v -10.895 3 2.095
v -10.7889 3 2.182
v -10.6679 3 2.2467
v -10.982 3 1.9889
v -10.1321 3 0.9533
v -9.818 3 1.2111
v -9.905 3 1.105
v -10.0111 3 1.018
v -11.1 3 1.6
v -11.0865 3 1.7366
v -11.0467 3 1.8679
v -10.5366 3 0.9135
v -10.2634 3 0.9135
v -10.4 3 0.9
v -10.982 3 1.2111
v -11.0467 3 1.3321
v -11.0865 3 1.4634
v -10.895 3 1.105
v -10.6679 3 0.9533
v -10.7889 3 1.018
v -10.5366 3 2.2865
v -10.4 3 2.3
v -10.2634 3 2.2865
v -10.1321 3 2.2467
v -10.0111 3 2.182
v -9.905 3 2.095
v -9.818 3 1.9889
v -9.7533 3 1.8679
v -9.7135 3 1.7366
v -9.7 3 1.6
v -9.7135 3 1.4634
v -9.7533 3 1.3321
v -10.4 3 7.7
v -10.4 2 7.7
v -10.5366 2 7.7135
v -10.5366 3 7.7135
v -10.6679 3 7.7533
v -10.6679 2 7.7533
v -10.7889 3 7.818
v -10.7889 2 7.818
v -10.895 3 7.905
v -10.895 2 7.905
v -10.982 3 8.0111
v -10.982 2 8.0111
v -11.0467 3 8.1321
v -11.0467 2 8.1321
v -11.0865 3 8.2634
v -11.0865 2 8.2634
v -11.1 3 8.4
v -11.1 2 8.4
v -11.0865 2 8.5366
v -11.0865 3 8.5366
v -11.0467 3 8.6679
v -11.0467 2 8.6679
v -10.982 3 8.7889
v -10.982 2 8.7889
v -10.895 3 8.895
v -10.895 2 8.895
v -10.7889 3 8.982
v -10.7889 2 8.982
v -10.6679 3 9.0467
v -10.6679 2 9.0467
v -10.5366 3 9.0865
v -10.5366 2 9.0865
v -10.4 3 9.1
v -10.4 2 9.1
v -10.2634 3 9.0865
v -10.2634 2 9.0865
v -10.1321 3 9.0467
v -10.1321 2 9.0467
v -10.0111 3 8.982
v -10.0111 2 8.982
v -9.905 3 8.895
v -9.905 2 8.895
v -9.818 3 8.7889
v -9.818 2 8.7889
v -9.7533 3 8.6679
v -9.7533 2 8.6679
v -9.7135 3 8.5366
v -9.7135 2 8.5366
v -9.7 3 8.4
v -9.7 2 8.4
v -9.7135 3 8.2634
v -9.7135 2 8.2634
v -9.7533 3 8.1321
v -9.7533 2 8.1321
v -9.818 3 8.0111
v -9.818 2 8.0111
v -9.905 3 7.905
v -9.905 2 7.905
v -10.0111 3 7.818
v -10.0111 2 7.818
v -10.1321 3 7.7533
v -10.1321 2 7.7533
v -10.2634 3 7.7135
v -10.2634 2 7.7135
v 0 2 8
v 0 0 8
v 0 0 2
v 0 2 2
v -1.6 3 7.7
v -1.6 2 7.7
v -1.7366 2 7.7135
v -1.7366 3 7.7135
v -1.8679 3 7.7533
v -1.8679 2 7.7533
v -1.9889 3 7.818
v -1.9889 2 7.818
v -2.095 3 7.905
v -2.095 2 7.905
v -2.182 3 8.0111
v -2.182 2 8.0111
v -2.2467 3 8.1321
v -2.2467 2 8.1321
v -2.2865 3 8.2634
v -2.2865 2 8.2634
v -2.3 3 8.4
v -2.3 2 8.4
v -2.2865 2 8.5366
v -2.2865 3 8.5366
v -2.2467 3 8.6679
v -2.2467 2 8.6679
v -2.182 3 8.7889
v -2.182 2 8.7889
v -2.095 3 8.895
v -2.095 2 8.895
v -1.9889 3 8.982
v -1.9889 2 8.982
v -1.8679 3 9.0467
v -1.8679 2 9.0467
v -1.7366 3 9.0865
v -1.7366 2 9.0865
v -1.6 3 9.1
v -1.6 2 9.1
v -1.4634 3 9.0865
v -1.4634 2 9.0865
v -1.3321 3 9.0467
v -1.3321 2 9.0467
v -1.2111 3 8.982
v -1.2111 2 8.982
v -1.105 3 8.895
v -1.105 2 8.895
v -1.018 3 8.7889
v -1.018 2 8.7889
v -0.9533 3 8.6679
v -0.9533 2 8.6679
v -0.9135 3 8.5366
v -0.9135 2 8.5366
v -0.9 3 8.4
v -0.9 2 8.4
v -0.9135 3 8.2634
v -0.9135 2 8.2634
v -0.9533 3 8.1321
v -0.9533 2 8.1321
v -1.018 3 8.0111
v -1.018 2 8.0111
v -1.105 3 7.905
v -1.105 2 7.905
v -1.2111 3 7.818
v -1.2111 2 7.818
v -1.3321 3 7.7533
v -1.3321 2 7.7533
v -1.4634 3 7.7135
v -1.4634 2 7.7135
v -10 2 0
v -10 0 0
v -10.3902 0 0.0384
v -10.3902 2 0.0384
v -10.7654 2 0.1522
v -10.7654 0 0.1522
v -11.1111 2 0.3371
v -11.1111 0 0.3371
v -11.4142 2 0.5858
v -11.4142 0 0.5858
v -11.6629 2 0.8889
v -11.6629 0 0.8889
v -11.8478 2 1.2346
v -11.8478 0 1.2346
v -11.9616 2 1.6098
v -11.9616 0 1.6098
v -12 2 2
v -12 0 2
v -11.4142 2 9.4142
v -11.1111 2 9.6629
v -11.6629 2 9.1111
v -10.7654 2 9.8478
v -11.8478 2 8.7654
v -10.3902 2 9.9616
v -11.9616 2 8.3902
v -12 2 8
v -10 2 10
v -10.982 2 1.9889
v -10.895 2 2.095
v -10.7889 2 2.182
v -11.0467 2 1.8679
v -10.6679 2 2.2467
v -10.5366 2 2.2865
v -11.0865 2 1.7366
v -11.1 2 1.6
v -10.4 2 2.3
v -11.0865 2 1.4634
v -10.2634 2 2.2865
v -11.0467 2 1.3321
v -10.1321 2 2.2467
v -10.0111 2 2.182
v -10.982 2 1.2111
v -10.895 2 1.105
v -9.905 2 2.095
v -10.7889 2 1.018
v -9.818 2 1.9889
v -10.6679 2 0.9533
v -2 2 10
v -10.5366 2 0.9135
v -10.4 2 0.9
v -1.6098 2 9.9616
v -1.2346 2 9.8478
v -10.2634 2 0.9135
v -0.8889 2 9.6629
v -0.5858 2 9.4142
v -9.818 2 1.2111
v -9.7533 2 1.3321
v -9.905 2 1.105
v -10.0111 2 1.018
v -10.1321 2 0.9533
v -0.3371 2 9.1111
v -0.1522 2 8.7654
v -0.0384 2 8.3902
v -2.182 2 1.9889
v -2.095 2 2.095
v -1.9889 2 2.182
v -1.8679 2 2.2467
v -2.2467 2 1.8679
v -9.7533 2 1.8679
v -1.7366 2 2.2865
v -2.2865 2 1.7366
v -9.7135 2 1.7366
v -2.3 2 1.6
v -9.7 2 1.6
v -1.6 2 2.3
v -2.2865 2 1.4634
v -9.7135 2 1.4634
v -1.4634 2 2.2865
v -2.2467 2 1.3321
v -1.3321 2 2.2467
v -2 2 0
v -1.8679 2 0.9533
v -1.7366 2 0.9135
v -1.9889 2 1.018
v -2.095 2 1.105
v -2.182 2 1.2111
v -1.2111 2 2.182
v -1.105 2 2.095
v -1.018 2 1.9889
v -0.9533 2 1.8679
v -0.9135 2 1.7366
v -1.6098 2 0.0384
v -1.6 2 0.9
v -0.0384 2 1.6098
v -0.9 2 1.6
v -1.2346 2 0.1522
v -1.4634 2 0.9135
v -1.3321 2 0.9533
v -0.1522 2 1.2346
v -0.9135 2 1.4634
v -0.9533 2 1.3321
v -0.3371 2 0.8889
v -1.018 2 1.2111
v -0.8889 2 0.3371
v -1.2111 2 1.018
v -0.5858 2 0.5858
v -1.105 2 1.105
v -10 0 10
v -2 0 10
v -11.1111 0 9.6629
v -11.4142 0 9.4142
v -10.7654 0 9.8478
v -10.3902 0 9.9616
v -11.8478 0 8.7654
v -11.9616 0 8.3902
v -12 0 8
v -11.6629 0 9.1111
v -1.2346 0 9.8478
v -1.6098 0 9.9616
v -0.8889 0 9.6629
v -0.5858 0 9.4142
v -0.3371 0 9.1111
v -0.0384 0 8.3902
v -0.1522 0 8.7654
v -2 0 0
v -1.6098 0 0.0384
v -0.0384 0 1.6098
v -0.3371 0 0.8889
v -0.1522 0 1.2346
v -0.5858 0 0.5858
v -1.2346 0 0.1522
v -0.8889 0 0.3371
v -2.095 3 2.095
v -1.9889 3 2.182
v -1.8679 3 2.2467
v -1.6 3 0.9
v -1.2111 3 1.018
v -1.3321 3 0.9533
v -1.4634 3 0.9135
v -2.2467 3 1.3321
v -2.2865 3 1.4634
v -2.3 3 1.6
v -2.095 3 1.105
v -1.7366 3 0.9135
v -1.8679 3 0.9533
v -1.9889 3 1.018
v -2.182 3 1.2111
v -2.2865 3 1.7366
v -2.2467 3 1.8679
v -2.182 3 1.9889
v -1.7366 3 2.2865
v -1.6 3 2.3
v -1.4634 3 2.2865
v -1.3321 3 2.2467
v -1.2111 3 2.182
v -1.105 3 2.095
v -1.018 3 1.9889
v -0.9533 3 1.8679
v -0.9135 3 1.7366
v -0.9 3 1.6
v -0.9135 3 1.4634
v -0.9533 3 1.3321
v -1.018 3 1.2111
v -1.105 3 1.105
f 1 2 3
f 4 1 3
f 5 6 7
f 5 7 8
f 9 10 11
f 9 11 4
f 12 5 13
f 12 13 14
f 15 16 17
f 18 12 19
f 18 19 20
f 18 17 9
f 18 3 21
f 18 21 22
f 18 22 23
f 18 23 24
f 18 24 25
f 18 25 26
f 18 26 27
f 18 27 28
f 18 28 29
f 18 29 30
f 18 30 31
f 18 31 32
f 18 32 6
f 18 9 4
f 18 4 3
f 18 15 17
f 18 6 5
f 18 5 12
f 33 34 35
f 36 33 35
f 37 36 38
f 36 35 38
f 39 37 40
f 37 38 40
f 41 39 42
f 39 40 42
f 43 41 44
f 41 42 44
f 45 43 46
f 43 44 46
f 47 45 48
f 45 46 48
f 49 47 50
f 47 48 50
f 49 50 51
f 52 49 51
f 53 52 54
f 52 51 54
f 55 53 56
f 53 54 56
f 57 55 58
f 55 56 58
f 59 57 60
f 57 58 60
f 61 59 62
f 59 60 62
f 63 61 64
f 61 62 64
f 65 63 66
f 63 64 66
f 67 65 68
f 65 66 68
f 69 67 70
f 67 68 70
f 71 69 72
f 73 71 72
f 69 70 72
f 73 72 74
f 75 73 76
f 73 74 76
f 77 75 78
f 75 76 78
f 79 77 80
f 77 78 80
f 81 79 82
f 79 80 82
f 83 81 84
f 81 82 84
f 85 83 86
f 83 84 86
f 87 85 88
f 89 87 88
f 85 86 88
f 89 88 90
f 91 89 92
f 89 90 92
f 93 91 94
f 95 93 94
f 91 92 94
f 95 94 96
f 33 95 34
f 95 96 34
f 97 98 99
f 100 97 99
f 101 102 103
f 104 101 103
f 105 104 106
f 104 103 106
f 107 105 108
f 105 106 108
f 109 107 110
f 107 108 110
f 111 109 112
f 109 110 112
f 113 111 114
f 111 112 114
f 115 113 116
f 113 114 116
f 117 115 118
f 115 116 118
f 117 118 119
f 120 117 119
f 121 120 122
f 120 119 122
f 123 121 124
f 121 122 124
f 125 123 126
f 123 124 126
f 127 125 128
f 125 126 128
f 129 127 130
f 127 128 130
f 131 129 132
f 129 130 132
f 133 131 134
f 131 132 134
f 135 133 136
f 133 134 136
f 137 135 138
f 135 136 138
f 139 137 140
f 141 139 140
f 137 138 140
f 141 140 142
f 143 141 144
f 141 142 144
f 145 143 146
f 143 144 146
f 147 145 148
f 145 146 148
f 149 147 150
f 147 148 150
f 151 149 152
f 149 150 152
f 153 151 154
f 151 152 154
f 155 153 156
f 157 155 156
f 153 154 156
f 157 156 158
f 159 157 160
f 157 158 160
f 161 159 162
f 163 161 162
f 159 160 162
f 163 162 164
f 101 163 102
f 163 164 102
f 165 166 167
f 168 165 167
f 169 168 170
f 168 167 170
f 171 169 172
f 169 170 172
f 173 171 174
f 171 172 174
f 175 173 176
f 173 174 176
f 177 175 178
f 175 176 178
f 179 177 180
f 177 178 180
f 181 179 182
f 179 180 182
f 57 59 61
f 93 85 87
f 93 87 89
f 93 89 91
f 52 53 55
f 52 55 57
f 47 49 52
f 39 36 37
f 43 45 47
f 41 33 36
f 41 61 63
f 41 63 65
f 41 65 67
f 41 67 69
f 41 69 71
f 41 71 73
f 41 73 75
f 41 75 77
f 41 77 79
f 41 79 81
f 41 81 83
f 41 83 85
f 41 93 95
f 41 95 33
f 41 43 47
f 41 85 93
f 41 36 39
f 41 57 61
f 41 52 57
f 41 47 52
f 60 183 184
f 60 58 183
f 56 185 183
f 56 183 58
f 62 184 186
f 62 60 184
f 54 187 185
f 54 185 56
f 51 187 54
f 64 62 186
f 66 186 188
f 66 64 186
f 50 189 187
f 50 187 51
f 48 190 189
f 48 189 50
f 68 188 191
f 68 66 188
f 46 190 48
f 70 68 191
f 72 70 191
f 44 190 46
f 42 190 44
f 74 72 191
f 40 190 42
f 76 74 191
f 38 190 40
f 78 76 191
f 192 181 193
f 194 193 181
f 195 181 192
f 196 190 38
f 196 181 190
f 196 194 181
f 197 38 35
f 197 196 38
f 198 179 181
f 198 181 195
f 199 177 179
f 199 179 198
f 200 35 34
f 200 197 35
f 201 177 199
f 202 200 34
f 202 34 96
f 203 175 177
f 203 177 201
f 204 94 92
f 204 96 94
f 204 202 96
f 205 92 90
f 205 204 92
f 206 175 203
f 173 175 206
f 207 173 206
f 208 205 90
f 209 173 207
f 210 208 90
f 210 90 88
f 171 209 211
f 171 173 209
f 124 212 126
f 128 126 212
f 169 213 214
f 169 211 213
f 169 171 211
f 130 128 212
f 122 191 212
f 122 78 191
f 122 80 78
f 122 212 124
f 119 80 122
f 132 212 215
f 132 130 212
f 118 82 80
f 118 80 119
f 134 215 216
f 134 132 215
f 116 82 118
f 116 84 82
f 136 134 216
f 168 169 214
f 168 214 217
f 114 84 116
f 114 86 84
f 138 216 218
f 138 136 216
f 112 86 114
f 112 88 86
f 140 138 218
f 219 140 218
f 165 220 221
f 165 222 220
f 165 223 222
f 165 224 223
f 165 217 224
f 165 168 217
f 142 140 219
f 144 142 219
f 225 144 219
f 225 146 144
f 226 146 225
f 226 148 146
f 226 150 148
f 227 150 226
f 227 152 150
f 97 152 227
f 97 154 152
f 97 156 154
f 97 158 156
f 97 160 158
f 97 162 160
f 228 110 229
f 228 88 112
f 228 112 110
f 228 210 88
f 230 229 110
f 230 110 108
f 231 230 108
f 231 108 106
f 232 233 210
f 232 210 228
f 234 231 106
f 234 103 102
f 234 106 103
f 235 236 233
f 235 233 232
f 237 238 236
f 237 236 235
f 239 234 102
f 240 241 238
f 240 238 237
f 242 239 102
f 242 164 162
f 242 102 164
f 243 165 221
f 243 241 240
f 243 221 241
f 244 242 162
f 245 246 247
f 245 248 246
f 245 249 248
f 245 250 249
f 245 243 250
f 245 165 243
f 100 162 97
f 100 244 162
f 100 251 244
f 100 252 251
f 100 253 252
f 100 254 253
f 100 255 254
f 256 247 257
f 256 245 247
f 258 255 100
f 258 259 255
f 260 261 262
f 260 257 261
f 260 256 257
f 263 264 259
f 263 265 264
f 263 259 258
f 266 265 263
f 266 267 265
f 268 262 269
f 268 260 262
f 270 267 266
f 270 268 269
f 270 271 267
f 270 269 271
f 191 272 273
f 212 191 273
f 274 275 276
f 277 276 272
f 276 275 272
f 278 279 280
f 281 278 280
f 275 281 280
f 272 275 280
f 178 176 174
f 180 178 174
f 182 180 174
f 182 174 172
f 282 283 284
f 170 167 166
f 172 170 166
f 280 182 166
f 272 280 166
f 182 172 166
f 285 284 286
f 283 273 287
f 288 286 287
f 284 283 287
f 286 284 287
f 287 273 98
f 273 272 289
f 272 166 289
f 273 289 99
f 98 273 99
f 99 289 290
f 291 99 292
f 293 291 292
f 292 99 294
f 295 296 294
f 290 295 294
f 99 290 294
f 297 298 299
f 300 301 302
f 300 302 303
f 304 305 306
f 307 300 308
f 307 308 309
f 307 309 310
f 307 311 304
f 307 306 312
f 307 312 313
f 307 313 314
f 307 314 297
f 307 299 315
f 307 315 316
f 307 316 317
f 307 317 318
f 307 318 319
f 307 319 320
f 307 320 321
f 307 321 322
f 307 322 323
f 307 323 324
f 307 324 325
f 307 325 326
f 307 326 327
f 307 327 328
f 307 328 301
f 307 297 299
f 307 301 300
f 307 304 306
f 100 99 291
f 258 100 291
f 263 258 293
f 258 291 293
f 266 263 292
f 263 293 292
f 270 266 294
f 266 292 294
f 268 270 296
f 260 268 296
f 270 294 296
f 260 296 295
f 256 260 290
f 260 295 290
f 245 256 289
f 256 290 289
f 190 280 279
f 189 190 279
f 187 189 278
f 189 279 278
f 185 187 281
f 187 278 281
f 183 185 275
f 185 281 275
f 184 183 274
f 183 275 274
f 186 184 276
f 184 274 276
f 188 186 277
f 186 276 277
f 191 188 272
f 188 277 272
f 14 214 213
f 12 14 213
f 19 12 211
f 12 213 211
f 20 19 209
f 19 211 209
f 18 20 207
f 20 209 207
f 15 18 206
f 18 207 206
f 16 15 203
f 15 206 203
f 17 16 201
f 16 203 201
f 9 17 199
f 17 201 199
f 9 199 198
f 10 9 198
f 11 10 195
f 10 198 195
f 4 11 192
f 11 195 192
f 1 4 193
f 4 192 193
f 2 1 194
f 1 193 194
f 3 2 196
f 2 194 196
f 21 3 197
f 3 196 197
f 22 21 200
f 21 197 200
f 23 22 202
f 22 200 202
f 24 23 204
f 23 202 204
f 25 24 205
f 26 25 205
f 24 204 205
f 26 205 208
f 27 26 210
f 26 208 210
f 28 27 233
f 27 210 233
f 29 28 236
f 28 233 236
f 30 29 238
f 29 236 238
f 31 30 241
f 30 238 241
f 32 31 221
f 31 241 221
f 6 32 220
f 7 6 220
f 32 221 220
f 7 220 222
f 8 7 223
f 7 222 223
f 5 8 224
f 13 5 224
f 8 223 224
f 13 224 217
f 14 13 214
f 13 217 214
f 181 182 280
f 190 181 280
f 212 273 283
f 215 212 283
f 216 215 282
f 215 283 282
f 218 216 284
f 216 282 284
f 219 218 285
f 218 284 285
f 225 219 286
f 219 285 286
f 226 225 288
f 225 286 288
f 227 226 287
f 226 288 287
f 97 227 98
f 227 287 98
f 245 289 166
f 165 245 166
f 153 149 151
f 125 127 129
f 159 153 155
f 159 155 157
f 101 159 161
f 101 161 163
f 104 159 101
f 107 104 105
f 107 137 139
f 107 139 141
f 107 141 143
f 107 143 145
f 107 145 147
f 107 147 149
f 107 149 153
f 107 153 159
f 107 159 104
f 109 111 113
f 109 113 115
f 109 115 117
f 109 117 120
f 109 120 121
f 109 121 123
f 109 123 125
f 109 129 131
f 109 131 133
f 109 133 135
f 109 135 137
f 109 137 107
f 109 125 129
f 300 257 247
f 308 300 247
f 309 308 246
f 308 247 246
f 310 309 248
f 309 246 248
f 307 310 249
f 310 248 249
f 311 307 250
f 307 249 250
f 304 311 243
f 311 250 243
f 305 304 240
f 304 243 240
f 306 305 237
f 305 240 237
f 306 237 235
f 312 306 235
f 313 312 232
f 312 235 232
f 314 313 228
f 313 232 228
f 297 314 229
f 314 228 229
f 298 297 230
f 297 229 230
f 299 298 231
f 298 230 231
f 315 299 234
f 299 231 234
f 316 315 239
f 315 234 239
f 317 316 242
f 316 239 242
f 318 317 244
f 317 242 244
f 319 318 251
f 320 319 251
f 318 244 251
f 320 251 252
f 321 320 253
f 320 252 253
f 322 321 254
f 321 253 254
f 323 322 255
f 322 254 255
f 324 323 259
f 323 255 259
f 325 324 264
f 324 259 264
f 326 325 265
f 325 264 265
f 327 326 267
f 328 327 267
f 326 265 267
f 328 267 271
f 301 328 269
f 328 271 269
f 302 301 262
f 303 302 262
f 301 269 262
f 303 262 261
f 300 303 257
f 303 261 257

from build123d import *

# Parameters (mm, degrees)
BOSS_EXTRUDE1_DEPTH = 2
SKETCH3_R           = 0.7
BOSS_EXTRUDE3_DEPTH = 1


with BuildPart() as part:
    # Sketch1 → Boss-Extrude1 (new body)
    with BuildSketch(Plane(origin=(0, 0, 0), x_dir=(1, 0, 0), z_dir=(0, 1, 0))):
        with BuildLine():
            Line((-2, 0), (-10, 0))
            ThreePointArc((-10, 0), (-11.414213562, -0.585786438), (-12, -2))
            Line((-12, -2), (-12, -8))
            ThreePointArc((-12, -8), (-11.414213562, -9.414213562), (-10, -10))
            Line((-10, -10), (-2, -10))
            ThreePointArc((-2, -10), (-0.585786438, -9.414213562), (0, -8))
            Line((0, -8), (0, -2))
            ThreePointArc((0, -2), (-0.585786438, -0.585786438), (-2, 0))
        make_face()
    extrude(amount=BOSS_EXTRUDE1_DEPTH)

    # Sketch3 → Boss-Extrude3 (add)
    with BuildSketch(Plane(origin=(0, 2, 0), x_dir=(1, 0, 0), z_dir=(0, 1, 0))):
        with Locations(Location((-10.4, -1.6, 0), (0, 0, 90))):
            Circle(SKETCH3_R)
        with Locations(Location((-1.6, -1.6, 0), (0, 0, 90))):
            Circle(SKETCH3_R)
        with Locations(Location((-1.6, -8.4, 0), (0, 0, 90))):
            Circle(SKETCH3_R)
        with Locations(Location((-10.4, -8.4, 0), (0, 0, 90))):
            Circle(SKETCH3_R)
    extrude(amount=BOSS_EXTRUDE3_DEPTH)


solid = part.part
